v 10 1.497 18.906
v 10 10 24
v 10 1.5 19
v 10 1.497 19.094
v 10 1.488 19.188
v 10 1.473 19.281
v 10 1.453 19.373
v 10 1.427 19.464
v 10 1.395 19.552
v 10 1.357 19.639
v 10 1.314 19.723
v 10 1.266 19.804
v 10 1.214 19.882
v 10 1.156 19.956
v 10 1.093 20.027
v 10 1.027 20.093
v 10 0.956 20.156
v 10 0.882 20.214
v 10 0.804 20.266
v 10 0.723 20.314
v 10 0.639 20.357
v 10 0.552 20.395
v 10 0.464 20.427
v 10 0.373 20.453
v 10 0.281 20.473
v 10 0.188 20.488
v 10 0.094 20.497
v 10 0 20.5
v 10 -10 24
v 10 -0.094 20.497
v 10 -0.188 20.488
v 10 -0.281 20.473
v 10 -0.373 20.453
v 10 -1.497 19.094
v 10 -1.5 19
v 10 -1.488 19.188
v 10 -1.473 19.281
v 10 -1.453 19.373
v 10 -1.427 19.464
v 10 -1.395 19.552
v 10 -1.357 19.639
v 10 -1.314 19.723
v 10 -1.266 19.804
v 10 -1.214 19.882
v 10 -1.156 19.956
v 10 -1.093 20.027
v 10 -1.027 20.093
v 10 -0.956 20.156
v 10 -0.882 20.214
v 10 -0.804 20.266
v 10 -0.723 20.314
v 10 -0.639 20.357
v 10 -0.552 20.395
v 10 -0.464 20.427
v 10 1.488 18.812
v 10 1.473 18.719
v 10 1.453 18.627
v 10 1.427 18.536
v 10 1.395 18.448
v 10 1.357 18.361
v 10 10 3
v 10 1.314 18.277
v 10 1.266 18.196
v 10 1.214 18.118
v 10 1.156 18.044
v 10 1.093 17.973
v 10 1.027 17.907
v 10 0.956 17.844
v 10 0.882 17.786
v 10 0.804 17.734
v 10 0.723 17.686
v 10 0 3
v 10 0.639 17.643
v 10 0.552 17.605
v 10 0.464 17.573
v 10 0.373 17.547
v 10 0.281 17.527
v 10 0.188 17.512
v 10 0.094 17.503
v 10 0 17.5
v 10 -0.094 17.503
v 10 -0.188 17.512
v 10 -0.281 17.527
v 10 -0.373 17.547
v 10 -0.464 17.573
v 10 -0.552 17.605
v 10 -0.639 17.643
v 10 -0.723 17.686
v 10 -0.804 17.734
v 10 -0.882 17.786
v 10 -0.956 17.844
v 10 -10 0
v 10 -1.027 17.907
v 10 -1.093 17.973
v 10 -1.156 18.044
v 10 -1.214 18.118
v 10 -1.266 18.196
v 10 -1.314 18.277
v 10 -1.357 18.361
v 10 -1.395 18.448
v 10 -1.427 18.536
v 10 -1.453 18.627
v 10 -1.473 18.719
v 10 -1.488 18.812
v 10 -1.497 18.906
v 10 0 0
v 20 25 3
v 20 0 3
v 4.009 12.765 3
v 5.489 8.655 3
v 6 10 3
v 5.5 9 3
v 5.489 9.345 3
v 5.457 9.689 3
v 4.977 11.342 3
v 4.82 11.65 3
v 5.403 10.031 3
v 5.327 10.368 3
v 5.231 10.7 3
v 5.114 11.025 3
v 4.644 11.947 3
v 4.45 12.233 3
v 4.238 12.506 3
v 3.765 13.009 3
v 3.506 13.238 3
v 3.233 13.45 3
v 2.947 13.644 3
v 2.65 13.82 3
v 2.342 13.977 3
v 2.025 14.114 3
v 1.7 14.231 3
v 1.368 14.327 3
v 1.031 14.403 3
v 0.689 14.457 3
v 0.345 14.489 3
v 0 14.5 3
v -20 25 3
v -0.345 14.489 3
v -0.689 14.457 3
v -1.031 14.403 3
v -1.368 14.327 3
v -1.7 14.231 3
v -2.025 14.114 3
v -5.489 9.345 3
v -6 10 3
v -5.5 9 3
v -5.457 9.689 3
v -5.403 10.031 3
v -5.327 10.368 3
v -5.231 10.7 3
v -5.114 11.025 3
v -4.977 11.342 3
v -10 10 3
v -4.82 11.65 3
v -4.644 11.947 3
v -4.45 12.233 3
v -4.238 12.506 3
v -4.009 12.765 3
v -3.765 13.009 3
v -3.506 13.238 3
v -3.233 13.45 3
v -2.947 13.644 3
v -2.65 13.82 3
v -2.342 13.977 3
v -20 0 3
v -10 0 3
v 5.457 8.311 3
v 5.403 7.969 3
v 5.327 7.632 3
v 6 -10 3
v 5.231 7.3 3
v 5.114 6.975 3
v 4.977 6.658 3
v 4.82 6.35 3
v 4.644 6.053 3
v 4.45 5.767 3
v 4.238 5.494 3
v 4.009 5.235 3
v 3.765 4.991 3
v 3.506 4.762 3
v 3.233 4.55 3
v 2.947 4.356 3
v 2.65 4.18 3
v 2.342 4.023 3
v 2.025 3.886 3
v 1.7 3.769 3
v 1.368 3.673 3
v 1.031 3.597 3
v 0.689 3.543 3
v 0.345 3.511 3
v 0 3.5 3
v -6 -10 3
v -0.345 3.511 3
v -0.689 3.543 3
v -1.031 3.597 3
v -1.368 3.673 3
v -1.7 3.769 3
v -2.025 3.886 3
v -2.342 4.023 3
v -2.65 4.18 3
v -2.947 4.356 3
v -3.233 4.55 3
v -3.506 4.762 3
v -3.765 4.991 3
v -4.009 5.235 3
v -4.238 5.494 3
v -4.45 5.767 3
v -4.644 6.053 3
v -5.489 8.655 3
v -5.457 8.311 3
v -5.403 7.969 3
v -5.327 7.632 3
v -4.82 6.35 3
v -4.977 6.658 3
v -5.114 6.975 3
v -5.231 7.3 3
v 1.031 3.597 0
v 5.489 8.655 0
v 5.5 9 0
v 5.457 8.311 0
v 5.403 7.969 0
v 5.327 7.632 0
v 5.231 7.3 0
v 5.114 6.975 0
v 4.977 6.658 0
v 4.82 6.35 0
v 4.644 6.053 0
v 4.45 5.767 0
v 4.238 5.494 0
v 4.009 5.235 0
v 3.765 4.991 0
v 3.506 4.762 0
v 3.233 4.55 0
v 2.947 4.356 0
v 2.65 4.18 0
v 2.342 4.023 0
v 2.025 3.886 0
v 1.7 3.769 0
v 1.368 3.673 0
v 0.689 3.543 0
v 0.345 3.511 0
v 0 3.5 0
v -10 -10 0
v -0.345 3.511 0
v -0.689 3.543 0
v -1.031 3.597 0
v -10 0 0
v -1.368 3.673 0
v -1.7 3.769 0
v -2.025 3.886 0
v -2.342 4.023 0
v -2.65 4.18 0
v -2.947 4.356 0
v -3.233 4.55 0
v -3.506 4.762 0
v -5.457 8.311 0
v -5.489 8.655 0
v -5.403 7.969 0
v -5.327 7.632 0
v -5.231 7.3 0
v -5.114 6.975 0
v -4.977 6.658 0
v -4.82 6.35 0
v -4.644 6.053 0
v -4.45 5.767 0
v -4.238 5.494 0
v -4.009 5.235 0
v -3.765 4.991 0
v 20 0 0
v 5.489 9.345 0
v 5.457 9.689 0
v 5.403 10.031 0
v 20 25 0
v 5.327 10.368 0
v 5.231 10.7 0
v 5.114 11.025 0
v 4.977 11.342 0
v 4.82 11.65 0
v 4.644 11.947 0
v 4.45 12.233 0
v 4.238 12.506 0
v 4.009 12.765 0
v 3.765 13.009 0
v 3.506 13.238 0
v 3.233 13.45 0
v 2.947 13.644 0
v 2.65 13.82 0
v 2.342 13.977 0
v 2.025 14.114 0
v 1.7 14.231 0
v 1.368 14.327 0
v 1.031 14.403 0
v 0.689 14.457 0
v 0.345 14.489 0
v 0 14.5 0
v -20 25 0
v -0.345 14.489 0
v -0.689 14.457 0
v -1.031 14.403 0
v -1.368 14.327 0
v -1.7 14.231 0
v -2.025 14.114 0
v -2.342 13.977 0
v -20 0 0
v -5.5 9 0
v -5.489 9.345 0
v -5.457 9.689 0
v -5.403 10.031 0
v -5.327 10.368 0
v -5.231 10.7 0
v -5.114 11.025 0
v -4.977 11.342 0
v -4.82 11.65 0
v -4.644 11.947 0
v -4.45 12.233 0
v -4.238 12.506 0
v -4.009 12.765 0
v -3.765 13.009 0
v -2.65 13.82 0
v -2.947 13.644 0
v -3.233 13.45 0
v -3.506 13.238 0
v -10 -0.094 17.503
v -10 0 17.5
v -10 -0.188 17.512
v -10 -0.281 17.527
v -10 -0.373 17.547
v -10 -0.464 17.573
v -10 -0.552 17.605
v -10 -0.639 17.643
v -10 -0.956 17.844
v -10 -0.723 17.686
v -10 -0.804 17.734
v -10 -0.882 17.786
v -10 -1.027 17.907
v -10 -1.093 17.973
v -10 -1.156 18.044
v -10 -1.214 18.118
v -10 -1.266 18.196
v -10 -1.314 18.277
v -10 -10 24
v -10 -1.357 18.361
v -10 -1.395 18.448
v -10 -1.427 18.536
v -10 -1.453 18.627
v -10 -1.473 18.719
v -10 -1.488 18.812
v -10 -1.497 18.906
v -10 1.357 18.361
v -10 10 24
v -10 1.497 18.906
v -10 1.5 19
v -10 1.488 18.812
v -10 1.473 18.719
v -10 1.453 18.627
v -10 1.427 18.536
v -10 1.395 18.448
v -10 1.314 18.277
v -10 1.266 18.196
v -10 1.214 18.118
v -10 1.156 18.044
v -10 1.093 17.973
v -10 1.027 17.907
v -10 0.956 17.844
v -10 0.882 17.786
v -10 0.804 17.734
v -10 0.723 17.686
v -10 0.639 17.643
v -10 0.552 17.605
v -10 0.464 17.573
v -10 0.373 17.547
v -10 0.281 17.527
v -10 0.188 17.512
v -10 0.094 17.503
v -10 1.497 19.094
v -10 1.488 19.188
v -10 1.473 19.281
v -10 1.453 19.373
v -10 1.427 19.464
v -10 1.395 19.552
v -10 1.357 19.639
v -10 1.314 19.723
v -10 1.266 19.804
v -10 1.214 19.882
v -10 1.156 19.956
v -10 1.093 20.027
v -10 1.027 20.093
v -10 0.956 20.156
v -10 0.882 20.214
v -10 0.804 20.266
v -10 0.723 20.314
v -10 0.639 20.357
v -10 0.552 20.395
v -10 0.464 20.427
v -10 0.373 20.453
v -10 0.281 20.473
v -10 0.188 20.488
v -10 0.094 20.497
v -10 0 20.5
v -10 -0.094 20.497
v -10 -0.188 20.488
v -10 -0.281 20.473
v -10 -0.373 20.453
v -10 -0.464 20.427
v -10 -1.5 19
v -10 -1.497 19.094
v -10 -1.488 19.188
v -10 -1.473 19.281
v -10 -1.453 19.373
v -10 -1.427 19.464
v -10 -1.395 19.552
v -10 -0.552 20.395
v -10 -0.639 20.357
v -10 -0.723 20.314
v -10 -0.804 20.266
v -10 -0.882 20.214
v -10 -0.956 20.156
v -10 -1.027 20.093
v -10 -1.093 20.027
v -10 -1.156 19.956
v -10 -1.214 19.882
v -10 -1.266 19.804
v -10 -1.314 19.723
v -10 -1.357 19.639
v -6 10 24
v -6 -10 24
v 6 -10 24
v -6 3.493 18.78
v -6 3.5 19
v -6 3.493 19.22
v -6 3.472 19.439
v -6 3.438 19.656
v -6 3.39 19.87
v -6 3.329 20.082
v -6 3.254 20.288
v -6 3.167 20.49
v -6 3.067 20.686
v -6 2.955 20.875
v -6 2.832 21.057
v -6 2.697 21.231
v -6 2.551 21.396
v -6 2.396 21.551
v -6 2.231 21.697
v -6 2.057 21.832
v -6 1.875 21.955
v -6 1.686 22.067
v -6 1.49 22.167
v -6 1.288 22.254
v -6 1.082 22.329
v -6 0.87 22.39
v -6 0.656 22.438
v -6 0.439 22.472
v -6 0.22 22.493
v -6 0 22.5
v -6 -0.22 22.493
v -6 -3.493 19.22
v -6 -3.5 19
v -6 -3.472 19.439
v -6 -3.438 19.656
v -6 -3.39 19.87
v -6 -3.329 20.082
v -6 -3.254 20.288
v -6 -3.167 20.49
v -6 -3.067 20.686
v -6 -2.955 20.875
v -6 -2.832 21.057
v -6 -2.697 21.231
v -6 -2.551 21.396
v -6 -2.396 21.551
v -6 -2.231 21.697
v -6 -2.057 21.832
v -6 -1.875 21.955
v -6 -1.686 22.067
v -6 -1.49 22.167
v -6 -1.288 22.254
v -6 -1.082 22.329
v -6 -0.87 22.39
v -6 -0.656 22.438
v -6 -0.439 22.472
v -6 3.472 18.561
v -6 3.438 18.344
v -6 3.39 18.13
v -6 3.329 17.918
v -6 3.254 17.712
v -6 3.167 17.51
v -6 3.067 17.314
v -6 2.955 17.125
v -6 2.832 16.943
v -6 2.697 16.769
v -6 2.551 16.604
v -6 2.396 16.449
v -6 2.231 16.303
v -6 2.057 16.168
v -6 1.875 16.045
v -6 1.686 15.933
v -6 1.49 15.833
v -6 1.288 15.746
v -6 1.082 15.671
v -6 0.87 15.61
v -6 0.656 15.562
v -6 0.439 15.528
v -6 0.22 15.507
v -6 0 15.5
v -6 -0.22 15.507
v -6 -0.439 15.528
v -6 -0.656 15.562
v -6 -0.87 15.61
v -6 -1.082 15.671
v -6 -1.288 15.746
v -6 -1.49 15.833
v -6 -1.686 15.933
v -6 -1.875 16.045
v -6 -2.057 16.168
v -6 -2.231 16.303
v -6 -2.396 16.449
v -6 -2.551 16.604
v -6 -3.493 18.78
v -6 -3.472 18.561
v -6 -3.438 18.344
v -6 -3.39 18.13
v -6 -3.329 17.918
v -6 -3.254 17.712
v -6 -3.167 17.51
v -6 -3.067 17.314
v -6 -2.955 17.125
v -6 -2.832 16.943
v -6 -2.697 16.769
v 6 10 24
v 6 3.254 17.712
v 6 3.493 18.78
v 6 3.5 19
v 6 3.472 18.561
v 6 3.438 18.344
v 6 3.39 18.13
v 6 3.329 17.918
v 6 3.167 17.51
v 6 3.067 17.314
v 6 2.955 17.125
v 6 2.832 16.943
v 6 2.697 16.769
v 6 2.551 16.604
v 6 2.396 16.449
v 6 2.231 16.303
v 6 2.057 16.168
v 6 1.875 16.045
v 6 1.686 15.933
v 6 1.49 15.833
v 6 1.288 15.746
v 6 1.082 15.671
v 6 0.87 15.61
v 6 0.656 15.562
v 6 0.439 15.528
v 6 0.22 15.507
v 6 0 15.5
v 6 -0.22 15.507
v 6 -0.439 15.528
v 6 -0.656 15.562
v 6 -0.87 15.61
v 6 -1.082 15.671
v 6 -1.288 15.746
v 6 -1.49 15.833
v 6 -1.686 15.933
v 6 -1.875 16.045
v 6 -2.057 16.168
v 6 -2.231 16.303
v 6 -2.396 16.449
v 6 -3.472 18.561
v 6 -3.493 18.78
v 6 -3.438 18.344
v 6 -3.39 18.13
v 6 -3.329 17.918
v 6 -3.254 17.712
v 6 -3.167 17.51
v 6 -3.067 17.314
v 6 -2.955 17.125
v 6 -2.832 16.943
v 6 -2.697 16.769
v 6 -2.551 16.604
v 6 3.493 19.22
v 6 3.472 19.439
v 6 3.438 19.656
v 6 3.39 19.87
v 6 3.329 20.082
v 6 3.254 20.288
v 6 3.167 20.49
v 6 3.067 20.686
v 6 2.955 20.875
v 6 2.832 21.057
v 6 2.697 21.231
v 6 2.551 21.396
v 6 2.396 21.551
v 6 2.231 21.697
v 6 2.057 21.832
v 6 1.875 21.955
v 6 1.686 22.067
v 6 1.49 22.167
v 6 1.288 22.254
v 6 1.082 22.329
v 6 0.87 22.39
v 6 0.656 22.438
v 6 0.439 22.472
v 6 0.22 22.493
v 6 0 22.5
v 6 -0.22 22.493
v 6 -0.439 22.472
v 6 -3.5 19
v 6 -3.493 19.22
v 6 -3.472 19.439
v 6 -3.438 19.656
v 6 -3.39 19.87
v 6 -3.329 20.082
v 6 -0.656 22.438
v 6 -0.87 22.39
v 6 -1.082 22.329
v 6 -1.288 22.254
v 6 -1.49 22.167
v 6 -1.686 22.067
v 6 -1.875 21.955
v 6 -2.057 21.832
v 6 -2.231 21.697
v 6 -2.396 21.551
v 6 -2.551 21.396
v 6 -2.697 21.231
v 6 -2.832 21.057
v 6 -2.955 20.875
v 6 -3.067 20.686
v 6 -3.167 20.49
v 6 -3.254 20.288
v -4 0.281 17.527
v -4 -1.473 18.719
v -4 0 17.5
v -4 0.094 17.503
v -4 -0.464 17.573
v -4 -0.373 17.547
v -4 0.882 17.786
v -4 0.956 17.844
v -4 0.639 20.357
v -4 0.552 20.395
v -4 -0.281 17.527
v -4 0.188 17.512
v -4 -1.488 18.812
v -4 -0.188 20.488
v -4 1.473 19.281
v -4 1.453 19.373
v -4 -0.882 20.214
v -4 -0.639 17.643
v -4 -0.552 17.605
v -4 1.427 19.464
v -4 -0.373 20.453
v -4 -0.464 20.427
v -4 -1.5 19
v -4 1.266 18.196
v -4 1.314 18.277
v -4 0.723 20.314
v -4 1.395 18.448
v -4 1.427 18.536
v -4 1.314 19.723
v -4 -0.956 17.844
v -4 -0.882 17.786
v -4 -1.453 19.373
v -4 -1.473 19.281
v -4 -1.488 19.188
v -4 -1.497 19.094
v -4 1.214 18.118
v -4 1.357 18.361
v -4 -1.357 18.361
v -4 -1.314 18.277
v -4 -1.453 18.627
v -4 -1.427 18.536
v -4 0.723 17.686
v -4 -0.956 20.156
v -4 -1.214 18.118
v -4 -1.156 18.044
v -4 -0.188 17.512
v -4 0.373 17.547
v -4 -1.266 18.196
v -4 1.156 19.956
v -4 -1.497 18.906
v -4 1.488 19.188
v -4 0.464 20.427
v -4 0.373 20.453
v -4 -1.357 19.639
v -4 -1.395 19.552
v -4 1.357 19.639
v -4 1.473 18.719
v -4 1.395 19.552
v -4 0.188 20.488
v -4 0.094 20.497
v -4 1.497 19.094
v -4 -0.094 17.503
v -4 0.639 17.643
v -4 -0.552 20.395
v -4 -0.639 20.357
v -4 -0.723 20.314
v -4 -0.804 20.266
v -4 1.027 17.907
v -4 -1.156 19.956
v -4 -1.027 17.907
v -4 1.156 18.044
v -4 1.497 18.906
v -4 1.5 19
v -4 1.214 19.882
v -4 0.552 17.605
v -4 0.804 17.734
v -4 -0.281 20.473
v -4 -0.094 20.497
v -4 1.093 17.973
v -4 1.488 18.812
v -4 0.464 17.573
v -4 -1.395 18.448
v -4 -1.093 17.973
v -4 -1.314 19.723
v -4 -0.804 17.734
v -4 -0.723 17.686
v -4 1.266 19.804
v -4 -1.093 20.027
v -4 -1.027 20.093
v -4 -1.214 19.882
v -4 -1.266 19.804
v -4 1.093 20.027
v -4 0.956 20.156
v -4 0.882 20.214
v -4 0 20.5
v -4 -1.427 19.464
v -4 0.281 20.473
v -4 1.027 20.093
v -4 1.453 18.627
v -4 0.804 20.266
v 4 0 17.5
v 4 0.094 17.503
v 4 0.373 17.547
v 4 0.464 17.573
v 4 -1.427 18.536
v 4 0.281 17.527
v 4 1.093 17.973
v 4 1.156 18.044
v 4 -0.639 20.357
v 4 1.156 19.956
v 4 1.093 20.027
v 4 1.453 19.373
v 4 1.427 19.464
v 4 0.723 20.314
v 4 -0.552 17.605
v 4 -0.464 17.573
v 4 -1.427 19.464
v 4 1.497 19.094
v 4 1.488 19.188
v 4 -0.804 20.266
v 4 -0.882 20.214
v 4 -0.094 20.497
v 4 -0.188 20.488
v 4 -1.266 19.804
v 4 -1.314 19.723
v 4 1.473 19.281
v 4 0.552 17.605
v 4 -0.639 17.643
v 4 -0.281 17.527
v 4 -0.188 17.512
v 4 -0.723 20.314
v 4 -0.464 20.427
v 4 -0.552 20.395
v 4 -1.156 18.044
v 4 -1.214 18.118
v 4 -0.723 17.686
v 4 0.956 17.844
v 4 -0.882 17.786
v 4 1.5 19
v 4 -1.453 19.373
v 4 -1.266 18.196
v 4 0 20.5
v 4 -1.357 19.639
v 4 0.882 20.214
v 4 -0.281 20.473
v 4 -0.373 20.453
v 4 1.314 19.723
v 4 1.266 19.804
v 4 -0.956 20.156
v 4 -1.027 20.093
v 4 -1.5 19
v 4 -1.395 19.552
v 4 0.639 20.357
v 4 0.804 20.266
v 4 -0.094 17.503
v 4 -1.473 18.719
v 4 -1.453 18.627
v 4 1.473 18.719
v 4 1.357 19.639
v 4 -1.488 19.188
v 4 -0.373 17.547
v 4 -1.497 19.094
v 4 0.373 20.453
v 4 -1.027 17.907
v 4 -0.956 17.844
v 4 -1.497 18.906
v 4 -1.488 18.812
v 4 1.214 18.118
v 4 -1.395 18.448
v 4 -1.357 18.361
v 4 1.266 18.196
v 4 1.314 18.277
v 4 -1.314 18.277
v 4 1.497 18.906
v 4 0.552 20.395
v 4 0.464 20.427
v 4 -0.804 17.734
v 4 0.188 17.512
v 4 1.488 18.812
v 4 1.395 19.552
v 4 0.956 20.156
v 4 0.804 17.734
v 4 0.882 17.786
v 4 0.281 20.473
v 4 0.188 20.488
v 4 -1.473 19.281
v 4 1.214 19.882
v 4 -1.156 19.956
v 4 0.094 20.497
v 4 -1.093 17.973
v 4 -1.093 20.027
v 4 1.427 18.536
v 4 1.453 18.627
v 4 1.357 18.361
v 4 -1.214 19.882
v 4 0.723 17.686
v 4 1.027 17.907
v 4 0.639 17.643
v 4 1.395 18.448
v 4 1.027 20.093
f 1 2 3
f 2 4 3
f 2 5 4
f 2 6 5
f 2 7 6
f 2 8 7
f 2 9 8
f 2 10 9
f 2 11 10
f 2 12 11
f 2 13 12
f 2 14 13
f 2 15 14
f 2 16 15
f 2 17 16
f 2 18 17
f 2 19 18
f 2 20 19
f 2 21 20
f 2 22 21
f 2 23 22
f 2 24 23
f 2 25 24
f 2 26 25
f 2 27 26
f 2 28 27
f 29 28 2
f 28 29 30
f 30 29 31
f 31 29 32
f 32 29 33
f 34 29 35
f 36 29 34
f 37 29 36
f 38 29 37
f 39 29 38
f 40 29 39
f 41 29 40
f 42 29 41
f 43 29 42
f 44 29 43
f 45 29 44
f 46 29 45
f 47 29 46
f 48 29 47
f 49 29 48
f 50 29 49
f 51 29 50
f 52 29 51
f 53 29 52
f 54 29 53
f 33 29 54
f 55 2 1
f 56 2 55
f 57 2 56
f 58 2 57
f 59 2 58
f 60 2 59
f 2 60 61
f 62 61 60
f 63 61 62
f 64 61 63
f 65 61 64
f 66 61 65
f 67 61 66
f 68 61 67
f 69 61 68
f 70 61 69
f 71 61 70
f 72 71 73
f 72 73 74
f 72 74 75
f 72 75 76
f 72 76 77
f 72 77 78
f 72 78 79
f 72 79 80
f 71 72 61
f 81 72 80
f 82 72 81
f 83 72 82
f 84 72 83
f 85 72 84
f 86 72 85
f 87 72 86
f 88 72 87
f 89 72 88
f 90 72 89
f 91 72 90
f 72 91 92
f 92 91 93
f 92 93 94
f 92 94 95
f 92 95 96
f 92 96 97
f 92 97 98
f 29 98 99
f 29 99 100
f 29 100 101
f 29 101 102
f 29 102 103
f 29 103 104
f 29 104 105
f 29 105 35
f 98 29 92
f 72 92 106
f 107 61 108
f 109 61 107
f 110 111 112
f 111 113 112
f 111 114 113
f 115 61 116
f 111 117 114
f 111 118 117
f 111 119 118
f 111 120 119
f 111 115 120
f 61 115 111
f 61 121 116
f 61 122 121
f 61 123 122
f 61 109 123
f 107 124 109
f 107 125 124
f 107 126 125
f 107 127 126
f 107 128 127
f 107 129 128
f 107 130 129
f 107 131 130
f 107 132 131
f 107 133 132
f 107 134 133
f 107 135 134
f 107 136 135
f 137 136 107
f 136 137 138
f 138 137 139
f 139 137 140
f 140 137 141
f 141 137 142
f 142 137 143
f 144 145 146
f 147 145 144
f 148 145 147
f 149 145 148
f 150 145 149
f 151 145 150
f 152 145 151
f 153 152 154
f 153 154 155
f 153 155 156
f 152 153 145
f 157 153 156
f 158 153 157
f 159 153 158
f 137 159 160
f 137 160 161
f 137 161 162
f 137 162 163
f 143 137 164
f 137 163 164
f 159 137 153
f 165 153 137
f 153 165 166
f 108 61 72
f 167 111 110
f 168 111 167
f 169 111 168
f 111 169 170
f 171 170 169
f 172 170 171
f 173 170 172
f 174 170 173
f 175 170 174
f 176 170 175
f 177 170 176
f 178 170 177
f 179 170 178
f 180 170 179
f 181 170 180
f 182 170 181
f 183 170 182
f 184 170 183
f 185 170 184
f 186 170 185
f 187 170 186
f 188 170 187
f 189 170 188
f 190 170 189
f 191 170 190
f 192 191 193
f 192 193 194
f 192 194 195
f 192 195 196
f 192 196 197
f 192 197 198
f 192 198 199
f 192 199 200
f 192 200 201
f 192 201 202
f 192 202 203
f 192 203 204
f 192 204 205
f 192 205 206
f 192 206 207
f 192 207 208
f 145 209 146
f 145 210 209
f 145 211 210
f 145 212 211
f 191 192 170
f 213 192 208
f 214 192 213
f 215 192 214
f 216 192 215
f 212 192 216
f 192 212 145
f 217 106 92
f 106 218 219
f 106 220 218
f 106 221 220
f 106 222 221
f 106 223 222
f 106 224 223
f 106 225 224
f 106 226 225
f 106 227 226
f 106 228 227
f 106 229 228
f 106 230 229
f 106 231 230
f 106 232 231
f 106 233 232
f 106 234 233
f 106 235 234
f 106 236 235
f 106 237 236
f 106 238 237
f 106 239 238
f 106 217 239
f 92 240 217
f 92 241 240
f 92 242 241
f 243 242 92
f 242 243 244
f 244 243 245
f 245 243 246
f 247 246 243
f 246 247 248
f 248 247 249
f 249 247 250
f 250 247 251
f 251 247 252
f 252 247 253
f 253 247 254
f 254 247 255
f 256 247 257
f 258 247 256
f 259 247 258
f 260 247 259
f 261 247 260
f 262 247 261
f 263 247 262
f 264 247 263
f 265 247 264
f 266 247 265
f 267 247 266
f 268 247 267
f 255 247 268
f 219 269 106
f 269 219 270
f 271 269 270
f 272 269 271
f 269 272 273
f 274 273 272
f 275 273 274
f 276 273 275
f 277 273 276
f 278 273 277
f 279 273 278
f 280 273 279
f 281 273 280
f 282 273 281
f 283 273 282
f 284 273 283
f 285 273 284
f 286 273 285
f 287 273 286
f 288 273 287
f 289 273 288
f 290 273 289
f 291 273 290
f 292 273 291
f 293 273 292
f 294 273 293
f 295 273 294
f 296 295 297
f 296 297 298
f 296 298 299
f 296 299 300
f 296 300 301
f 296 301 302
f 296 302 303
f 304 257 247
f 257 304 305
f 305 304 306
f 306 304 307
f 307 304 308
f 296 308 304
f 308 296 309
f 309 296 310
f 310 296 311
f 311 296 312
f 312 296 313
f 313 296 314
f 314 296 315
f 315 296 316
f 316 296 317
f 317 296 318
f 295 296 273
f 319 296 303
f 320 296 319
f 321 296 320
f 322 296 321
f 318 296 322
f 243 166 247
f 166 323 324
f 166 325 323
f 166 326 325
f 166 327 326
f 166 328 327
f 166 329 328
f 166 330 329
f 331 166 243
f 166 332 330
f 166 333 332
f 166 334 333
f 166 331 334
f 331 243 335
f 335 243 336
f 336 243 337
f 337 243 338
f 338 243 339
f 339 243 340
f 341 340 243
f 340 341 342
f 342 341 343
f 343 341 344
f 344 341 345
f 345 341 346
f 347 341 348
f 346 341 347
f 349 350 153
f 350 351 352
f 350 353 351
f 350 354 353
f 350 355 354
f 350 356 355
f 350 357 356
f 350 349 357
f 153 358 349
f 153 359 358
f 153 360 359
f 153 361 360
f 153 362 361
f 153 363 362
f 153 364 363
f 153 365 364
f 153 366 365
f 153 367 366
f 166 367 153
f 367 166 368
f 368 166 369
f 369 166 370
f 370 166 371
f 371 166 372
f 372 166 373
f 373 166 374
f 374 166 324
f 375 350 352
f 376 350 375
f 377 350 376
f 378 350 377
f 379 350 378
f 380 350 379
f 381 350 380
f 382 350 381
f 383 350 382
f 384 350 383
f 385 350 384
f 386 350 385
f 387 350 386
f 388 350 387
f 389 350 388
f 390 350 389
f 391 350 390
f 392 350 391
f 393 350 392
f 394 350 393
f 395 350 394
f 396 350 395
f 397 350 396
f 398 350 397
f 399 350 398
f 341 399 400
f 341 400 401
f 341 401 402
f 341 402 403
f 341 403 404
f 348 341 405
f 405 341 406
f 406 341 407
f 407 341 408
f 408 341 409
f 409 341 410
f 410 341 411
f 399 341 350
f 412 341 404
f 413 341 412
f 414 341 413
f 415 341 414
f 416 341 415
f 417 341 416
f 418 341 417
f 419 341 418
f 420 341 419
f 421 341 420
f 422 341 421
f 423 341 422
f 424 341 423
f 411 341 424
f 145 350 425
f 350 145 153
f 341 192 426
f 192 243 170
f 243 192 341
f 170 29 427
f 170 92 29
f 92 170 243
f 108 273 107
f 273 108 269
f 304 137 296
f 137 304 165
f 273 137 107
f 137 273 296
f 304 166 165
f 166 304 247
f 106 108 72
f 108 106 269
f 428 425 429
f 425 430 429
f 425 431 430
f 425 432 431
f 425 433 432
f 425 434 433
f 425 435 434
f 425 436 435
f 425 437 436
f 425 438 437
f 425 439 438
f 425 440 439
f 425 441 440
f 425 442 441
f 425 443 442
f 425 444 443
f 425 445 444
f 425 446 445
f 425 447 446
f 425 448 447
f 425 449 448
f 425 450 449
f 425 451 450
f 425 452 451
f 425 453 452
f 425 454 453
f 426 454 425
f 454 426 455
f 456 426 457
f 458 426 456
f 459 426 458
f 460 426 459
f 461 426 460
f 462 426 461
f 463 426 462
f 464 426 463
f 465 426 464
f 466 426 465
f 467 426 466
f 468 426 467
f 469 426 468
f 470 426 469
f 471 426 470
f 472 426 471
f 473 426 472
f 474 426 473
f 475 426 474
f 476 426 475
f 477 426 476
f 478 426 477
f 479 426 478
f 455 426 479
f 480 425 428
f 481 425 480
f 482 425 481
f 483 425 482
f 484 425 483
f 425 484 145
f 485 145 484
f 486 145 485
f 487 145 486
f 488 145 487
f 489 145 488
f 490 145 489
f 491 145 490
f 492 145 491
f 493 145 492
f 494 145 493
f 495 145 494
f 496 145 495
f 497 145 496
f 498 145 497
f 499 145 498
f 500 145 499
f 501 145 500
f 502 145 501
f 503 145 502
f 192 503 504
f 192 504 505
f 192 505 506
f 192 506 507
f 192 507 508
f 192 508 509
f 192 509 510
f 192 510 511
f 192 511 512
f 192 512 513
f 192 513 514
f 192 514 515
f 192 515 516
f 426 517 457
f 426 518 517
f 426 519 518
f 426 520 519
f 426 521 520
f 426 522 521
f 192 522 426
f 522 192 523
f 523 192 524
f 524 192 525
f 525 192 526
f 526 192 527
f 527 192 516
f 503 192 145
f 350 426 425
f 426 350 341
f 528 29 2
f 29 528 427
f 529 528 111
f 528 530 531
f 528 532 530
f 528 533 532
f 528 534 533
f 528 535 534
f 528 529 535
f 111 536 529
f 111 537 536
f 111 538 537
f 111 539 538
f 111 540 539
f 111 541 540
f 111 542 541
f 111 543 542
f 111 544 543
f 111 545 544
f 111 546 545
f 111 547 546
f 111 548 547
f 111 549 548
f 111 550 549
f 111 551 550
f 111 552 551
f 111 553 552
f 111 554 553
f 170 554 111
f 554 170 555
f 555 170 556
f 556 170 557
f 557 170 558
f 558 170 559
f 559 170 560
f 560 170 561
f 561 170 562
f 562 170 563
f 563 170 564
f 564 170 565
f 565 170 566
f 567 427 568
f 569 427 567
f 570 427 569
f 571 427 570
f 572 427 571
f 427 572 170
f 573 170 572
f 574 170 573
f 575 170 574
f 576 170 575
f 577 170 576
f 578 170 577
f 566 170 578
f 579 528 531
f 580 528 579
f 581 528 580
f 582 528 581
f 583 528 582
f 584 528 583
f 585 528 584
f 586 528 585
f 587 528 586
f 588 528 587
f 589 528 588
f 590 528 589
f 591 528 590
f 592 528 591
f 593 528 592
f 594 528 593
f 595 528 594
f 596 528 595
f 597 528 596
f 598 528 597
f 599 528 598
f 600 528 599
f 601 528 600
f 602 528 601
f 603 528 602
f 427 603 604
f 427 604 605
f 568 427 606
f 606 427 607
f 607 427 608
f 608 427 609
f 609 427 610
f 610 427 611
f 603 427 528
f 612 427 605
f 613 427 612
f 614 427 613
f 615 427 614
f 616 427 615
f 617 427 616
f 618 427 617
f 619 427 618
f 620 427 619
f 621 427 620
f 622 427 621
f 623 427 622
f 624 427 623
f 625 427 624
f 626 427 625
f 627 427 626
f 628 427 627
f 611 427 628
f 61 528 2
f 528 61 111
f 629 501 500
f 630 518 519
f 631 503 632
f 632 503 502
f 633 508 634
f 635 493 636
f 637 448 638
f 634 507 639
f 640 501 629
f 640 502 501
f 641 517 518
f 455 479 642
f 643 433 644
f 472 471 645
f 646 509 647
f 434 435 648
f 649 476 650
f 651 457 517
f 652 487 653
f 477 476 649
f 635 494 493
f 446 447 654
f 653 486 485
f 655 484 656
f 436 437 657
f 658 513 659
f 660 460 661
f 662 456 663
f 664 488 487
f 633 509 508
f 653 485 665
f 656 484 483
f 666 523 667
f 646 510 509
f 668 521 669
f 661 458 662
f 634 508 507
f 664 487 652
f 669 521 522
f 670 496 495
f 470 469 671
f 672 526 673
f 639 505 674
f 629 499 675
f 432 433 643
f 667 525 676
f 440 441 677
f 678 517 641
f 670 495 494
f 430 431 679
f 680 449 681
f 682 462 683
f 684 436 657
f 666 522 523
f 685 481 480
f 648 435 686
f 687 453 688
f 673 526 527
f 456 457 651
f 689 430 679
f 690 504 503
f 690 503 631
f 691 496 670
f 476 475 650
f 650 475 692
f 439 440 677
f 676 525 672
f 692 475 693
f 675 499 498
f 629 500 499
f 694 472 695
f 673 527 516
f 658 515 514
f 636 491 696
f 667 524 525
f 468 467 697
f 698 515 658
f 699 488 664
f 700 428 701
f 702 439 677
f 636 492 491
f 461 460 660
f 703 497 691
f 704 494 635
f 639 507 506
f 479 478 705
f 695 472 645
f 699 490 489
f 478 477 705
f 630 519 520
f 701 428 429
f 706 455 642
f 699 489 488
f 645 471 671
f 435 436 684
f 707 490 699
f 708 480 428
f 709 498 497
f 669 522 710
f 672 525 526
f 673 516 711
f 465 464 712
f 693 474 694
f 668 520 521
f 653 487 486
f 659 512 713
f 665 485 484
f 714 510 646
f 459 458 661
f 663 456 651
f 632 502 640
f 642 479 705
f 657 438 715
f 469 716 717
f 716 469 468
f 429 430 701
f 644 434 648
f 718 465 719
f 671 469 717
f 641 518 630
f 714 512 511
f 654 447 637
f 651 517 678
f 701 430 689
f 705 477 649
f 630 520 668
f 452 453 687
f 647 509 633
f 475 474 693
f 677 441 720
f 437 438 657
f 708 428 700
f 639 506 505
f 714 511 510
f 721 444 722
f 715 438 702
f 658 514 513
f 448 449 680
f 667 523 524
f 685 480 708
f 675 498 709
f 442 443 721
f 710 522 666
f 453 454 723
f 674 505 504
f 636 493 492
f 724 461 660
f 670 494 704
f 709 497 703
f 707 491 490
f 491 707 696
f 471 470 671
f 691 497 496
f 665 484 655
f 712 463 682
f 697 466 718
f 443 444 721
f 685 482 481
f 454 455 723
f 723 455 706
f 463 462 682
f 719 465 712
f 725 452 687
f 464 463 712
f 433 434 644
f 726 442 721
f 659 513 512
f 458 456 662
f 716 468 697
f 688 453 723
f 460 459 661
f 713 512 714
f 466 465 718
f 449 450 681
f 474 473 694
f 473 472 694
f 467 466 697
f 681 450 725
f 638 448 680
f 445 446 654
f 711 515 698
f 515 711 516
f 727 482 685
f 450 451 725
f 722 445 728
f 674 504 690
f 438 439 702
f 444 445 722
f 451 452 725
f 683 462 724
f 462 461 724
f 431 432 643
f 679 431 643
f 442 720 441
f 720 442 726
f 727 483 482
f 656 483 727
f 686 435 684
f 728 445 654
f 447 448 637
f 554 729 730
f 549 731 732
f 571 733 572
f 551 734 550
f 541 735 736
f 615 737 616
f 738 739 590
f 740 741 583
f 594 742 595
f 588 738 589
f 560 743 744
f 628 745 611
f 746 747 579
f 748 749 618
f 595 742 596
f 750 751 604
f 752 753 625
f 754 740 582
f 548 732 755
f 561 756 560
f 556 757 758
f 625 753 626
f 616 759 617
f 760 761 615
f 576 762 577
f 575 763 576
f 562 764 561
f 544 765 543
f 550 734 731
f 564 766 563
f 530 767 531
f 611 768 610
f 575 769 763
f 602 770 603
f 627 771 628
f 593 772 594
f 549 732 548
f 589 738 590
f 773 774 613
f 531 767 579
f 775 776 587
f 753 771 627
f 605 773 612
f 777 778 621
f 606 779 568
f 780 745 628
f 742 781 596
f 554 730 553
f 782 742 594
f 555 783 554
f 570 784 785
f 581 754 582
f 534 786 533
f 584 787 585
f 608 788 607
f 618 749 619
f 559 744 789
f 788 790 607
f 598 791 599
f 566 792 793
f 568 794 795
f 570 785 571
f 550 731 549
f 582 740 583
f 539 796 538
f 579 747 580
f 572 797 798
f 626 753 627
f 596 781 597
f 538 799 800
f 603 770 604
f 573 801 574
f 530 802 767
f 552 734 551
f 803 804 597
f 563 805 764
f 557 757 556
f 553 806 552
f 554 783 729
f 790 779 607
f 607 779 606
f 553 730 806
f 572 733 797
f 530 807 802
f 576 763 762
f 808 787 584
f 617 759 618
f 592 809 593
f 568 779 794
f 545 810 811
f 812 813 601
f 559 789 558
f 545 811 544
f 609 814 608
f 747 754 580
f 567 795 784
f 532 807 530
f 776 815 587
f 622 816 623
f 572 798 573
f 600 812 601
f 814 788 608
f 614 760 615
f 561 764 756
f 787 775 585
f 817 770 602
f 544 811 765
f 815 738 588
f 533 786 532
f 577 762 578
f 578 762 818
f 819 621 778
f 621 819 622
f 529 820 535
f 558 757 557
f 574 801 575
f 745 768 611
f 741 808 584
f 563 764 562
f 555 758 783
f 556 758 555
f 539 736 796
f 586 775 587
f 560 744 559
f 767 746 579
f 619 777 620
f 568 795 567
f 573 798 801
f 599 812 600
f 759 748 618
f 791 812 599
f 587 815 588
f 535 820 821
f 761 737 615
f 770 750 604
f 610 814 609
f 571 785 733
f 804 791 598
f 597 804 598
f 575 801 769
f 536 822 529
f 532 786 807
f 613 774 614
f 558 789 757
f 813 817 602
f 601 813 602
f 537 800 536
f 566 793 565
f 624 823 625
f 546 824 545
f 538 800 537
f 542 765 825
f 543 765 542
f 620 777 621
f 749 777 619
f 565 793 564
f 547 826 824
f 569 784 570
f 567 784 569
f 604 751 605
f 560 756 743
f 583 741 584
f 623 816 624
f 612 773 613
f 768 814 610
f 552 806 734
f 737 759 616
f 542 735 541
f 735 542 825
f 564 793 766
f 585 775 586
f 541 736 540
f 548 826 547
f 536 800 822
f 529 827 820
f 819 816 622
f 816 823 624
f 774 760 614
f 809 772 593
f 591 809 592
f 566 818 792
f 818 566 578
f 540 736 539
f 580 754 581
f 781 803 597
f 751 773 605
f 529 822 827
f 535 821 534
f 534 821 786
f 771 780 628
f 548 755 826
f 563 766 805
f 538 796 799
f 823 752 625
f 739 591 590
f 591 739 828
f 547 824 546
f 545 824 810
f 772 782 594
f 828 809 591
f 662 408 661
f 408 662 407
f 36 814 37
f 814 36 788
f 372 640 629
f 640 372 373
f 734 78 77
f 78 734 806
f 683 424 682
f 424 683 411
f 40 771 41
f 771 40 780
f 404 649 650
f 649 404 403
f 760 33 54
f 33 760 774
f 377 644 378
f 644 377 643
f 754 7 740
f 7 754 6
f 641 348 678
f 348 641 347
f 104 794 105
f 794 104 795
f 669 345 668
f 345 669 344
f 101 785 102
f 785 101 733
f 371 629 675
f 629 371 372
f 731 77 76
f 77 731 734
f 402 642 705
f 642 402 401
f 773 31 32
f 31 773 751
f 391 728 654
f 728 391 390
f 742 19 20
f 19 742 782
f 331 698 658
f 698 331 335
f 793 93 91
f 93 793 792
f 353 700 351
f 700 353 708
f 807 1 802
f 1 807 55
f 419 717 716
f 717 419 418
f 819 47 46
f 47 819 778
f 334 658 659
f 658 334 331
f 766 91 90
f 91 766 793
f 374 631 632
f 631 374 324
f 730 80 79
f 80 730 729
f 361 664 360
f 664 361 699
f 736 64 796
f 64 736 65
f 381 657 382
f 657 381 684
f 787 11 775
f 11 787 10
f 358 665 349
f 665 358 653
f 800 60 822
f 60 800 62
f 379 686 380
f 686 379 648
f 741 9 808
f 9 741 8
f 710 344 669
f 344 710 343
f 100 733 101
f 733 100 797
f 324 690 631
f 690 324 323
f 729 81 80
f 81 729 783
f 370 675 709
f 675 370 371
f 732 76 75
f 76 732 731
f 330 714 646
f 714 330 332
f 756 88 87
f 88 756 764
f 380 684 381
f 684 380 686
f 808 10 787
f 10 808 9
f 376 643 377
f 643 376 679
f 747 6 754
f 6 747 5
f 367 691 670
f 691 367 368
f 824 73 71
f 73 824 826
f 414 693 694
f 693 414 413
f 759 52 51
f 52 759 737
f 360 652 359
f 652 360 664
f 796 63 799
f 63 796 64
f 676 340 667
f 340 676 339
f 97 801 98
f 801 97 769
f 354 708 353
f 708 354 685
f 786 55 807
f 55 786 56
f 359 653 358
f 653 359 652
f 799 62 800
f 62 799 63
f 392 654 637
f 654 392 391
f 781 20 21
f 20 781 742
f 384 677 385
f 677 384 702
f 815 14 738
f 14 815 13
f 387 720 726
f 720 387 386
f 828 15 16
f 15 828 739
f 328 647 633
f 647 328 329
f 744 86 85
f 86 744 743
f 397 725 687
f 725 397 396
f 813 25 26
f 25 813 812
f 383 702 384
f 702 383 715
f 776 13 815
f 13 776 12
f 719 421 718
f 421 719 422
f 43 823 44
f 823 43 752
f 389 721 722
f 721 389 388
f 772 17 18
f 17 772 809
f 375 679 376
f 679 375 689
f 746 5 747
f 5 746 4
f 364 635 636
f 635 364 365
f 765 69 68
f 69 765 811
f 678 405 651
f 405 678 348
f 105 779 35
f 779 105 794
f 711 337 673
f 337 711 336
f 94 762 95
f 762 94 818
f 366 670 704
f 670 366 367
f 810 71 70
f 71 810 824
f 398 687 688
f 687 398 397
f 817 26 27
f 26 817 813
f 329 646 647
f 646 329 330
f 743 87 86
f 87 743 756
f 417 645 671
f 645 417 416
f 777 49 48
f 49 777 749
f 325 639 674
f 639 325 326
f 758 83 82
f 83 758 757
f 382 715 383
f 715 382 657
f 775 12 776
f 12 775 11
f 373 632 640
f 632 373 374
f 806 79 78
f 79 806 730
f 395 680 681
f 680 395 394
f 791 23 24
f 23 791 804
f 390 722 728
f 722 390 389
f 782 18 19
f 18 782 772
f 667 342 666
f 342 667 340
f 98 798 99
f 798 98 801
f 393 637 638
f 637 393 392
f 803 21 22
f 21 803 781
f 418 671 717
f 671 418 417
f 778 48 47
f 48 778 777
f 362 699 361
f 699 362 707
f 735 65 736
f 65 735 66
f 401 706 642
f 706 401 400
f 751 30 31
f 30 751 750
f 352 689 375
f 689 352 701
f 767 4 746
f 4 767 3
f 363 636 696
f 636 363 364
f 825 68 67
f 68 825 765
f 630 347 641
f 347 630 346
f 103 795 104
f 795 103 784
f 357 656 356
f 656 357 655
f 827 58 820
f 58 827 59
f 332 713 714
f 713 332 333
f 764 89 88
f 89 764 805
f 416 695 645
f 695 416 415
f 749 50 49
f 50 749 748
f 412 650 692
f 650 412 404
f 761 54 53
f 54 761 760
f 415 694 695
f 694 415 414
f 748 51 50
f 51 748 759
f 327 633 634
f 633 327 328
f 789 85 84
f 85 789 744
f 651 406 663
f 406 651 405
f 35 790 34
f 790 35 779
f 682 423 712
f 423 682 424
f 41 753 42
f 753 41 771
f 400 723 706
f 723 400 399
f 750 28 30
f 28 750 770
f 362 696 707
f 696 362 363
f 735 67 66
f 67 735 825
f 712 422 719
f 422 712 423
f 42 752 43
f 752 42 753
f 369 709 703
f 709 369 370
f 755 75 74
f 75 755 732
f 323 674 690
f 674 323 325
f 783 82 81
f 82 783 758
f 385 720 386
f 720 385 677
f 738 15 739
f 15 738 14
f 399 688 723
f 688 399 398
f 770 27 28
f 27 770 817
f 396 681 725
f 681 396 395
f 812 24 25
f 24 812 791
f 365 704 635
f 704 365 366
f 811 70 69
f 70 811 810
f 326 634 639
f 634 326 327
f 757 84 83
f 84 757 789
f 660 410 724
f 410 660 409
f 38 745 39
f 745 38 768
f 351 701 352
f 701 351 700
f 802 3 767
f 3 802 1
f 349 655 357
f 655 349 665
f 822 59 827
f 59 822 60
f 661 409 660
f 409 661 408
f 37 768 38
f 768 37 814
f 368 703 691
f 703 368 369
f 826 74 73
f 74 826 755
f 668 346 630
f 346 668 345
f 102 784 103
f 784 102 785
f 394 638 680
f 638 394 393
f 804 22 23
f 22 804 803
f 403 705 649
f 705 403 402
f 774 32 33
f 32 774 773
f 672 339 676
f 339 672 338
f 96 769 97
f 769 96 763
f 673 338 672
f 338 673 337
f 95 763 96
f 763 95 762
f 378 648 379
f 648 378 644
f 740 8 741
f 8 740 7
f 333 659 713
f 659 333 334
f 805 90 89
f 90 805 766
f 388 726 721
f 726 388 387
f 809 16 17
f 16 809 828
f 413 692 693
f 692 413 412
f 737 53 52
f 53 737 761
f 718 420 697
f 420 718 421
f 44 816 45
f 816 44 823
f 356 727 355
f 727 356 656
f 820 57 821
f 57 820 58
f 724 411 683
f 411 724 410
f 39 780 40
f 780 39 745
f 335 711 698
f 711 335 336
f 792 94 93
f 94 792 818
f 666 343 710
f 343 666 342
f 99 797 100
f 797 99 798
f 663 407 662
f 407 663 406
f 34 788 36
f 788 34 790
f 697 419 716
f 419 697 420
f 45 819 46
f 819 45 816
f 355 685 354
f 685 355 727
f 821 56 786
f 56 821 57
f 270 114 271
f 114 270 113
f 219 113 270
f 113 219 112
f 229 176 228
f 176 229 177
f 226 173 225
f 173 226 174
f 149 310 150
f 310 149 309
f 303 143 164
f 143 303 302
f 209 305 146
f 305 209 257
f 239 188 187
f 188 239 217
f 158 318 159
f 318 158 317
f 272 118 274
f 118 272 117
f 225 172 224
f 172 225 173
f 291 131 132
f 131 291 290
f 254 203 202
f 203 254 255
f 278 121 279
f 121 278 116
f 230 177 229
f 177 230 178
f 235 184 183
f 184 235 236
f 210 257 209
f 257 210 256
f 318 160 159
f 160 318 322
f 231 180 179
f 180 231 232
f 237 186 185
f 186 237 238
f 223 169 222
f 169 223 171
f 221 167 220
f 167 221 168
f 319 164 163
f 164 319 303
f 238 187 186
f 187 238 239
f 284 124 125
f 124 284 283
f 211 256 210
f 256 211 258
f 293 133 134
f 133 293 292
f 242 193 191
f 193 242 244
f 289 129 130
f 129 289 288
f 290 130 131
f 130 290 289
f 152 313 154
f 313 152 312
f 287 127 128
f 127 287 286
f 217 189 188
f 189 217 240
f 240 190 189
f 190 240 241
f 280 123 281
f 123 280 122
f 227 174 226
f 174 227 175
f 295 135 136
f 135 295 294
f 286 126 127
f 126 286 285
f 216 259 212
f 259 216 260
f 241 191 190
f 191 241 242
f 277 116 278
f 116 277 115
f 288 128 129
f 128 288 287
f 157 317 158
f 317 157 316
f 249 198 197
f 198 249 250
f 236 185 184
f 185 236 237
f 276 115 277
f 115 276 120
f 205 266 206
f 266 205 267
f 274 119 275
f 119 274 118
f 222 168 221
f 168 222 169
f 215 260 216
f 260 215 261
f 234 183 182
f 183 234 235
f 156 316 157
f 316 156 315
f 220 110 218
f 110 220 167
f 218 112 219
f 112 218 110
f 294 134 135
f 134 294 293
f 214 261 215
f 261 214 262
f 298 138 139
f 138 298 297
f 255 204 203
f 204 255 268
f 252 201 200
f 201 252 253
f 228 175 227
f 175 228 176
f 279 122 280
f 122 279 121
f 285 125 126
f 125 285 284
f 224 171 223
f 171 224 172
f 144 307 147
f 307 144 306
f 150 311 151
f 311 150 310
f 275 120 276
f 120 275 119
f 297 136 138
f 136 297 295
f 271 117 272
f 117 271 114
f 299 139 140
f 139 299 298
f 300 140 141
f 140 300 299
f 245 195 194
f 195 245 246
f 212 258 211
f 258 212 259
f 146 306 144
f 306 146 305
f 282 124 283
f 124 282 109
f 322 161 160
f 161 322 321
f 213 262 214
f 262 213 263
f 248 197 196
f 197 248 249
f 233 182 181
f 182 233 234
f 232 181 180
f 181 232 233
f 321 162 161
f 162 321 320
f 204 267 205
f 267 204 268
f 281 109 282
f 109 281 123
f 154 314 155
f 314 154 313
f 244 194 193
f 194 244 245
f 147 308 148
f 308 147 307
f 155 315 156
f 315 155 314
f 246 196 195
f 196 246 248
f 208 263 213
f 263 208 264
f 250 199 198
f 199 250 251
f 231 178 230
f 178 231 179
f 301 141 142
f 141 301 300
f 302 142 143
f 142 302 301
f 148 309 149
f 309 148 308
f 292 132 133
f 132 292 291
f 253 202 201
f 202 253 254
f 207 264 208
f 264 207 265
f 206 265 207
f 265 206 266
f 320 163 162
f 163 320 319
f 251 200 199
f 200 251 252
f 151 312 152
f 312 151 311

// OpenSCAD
difference(){
	union(){    
        
        translate([-10,-10,0]){
              cube([20,20,3], center=false);
        }
        translate([-20,0,0]){
              cube([40,25,3], center=false);
        }

        translate([-10,-10,0]){
              cube([4,20,24], center=false);
        }
        translate([6,-10,0]){
              cube([4,20,24], center=false);
        }
       translate([-6,0,19]){
            rotate([0,90,0]){
                cylinder(h=2, r1=3.5, r2=1.5, $fn=100, center=false);
            }            
        }
       translate([4,0,19]){
            rotate([0,90,0]){
                cylinder(h=2, r1=1.5, r2=3.5, $fn=100, center=false);
            }            
        }

        

	}
	union() {

       translate([-20,0,19]){
            rotate([0,90,0]){
                cylinder(h=500, r=1.5, $fn=100, center=false);
            }            
        }
       translate([0,9,-10]){
            rotate([0,0,0]){
                cylinder(h=500, r=5.5, $fn=100, center=false);
            }            
        }
        
        
	}
}
